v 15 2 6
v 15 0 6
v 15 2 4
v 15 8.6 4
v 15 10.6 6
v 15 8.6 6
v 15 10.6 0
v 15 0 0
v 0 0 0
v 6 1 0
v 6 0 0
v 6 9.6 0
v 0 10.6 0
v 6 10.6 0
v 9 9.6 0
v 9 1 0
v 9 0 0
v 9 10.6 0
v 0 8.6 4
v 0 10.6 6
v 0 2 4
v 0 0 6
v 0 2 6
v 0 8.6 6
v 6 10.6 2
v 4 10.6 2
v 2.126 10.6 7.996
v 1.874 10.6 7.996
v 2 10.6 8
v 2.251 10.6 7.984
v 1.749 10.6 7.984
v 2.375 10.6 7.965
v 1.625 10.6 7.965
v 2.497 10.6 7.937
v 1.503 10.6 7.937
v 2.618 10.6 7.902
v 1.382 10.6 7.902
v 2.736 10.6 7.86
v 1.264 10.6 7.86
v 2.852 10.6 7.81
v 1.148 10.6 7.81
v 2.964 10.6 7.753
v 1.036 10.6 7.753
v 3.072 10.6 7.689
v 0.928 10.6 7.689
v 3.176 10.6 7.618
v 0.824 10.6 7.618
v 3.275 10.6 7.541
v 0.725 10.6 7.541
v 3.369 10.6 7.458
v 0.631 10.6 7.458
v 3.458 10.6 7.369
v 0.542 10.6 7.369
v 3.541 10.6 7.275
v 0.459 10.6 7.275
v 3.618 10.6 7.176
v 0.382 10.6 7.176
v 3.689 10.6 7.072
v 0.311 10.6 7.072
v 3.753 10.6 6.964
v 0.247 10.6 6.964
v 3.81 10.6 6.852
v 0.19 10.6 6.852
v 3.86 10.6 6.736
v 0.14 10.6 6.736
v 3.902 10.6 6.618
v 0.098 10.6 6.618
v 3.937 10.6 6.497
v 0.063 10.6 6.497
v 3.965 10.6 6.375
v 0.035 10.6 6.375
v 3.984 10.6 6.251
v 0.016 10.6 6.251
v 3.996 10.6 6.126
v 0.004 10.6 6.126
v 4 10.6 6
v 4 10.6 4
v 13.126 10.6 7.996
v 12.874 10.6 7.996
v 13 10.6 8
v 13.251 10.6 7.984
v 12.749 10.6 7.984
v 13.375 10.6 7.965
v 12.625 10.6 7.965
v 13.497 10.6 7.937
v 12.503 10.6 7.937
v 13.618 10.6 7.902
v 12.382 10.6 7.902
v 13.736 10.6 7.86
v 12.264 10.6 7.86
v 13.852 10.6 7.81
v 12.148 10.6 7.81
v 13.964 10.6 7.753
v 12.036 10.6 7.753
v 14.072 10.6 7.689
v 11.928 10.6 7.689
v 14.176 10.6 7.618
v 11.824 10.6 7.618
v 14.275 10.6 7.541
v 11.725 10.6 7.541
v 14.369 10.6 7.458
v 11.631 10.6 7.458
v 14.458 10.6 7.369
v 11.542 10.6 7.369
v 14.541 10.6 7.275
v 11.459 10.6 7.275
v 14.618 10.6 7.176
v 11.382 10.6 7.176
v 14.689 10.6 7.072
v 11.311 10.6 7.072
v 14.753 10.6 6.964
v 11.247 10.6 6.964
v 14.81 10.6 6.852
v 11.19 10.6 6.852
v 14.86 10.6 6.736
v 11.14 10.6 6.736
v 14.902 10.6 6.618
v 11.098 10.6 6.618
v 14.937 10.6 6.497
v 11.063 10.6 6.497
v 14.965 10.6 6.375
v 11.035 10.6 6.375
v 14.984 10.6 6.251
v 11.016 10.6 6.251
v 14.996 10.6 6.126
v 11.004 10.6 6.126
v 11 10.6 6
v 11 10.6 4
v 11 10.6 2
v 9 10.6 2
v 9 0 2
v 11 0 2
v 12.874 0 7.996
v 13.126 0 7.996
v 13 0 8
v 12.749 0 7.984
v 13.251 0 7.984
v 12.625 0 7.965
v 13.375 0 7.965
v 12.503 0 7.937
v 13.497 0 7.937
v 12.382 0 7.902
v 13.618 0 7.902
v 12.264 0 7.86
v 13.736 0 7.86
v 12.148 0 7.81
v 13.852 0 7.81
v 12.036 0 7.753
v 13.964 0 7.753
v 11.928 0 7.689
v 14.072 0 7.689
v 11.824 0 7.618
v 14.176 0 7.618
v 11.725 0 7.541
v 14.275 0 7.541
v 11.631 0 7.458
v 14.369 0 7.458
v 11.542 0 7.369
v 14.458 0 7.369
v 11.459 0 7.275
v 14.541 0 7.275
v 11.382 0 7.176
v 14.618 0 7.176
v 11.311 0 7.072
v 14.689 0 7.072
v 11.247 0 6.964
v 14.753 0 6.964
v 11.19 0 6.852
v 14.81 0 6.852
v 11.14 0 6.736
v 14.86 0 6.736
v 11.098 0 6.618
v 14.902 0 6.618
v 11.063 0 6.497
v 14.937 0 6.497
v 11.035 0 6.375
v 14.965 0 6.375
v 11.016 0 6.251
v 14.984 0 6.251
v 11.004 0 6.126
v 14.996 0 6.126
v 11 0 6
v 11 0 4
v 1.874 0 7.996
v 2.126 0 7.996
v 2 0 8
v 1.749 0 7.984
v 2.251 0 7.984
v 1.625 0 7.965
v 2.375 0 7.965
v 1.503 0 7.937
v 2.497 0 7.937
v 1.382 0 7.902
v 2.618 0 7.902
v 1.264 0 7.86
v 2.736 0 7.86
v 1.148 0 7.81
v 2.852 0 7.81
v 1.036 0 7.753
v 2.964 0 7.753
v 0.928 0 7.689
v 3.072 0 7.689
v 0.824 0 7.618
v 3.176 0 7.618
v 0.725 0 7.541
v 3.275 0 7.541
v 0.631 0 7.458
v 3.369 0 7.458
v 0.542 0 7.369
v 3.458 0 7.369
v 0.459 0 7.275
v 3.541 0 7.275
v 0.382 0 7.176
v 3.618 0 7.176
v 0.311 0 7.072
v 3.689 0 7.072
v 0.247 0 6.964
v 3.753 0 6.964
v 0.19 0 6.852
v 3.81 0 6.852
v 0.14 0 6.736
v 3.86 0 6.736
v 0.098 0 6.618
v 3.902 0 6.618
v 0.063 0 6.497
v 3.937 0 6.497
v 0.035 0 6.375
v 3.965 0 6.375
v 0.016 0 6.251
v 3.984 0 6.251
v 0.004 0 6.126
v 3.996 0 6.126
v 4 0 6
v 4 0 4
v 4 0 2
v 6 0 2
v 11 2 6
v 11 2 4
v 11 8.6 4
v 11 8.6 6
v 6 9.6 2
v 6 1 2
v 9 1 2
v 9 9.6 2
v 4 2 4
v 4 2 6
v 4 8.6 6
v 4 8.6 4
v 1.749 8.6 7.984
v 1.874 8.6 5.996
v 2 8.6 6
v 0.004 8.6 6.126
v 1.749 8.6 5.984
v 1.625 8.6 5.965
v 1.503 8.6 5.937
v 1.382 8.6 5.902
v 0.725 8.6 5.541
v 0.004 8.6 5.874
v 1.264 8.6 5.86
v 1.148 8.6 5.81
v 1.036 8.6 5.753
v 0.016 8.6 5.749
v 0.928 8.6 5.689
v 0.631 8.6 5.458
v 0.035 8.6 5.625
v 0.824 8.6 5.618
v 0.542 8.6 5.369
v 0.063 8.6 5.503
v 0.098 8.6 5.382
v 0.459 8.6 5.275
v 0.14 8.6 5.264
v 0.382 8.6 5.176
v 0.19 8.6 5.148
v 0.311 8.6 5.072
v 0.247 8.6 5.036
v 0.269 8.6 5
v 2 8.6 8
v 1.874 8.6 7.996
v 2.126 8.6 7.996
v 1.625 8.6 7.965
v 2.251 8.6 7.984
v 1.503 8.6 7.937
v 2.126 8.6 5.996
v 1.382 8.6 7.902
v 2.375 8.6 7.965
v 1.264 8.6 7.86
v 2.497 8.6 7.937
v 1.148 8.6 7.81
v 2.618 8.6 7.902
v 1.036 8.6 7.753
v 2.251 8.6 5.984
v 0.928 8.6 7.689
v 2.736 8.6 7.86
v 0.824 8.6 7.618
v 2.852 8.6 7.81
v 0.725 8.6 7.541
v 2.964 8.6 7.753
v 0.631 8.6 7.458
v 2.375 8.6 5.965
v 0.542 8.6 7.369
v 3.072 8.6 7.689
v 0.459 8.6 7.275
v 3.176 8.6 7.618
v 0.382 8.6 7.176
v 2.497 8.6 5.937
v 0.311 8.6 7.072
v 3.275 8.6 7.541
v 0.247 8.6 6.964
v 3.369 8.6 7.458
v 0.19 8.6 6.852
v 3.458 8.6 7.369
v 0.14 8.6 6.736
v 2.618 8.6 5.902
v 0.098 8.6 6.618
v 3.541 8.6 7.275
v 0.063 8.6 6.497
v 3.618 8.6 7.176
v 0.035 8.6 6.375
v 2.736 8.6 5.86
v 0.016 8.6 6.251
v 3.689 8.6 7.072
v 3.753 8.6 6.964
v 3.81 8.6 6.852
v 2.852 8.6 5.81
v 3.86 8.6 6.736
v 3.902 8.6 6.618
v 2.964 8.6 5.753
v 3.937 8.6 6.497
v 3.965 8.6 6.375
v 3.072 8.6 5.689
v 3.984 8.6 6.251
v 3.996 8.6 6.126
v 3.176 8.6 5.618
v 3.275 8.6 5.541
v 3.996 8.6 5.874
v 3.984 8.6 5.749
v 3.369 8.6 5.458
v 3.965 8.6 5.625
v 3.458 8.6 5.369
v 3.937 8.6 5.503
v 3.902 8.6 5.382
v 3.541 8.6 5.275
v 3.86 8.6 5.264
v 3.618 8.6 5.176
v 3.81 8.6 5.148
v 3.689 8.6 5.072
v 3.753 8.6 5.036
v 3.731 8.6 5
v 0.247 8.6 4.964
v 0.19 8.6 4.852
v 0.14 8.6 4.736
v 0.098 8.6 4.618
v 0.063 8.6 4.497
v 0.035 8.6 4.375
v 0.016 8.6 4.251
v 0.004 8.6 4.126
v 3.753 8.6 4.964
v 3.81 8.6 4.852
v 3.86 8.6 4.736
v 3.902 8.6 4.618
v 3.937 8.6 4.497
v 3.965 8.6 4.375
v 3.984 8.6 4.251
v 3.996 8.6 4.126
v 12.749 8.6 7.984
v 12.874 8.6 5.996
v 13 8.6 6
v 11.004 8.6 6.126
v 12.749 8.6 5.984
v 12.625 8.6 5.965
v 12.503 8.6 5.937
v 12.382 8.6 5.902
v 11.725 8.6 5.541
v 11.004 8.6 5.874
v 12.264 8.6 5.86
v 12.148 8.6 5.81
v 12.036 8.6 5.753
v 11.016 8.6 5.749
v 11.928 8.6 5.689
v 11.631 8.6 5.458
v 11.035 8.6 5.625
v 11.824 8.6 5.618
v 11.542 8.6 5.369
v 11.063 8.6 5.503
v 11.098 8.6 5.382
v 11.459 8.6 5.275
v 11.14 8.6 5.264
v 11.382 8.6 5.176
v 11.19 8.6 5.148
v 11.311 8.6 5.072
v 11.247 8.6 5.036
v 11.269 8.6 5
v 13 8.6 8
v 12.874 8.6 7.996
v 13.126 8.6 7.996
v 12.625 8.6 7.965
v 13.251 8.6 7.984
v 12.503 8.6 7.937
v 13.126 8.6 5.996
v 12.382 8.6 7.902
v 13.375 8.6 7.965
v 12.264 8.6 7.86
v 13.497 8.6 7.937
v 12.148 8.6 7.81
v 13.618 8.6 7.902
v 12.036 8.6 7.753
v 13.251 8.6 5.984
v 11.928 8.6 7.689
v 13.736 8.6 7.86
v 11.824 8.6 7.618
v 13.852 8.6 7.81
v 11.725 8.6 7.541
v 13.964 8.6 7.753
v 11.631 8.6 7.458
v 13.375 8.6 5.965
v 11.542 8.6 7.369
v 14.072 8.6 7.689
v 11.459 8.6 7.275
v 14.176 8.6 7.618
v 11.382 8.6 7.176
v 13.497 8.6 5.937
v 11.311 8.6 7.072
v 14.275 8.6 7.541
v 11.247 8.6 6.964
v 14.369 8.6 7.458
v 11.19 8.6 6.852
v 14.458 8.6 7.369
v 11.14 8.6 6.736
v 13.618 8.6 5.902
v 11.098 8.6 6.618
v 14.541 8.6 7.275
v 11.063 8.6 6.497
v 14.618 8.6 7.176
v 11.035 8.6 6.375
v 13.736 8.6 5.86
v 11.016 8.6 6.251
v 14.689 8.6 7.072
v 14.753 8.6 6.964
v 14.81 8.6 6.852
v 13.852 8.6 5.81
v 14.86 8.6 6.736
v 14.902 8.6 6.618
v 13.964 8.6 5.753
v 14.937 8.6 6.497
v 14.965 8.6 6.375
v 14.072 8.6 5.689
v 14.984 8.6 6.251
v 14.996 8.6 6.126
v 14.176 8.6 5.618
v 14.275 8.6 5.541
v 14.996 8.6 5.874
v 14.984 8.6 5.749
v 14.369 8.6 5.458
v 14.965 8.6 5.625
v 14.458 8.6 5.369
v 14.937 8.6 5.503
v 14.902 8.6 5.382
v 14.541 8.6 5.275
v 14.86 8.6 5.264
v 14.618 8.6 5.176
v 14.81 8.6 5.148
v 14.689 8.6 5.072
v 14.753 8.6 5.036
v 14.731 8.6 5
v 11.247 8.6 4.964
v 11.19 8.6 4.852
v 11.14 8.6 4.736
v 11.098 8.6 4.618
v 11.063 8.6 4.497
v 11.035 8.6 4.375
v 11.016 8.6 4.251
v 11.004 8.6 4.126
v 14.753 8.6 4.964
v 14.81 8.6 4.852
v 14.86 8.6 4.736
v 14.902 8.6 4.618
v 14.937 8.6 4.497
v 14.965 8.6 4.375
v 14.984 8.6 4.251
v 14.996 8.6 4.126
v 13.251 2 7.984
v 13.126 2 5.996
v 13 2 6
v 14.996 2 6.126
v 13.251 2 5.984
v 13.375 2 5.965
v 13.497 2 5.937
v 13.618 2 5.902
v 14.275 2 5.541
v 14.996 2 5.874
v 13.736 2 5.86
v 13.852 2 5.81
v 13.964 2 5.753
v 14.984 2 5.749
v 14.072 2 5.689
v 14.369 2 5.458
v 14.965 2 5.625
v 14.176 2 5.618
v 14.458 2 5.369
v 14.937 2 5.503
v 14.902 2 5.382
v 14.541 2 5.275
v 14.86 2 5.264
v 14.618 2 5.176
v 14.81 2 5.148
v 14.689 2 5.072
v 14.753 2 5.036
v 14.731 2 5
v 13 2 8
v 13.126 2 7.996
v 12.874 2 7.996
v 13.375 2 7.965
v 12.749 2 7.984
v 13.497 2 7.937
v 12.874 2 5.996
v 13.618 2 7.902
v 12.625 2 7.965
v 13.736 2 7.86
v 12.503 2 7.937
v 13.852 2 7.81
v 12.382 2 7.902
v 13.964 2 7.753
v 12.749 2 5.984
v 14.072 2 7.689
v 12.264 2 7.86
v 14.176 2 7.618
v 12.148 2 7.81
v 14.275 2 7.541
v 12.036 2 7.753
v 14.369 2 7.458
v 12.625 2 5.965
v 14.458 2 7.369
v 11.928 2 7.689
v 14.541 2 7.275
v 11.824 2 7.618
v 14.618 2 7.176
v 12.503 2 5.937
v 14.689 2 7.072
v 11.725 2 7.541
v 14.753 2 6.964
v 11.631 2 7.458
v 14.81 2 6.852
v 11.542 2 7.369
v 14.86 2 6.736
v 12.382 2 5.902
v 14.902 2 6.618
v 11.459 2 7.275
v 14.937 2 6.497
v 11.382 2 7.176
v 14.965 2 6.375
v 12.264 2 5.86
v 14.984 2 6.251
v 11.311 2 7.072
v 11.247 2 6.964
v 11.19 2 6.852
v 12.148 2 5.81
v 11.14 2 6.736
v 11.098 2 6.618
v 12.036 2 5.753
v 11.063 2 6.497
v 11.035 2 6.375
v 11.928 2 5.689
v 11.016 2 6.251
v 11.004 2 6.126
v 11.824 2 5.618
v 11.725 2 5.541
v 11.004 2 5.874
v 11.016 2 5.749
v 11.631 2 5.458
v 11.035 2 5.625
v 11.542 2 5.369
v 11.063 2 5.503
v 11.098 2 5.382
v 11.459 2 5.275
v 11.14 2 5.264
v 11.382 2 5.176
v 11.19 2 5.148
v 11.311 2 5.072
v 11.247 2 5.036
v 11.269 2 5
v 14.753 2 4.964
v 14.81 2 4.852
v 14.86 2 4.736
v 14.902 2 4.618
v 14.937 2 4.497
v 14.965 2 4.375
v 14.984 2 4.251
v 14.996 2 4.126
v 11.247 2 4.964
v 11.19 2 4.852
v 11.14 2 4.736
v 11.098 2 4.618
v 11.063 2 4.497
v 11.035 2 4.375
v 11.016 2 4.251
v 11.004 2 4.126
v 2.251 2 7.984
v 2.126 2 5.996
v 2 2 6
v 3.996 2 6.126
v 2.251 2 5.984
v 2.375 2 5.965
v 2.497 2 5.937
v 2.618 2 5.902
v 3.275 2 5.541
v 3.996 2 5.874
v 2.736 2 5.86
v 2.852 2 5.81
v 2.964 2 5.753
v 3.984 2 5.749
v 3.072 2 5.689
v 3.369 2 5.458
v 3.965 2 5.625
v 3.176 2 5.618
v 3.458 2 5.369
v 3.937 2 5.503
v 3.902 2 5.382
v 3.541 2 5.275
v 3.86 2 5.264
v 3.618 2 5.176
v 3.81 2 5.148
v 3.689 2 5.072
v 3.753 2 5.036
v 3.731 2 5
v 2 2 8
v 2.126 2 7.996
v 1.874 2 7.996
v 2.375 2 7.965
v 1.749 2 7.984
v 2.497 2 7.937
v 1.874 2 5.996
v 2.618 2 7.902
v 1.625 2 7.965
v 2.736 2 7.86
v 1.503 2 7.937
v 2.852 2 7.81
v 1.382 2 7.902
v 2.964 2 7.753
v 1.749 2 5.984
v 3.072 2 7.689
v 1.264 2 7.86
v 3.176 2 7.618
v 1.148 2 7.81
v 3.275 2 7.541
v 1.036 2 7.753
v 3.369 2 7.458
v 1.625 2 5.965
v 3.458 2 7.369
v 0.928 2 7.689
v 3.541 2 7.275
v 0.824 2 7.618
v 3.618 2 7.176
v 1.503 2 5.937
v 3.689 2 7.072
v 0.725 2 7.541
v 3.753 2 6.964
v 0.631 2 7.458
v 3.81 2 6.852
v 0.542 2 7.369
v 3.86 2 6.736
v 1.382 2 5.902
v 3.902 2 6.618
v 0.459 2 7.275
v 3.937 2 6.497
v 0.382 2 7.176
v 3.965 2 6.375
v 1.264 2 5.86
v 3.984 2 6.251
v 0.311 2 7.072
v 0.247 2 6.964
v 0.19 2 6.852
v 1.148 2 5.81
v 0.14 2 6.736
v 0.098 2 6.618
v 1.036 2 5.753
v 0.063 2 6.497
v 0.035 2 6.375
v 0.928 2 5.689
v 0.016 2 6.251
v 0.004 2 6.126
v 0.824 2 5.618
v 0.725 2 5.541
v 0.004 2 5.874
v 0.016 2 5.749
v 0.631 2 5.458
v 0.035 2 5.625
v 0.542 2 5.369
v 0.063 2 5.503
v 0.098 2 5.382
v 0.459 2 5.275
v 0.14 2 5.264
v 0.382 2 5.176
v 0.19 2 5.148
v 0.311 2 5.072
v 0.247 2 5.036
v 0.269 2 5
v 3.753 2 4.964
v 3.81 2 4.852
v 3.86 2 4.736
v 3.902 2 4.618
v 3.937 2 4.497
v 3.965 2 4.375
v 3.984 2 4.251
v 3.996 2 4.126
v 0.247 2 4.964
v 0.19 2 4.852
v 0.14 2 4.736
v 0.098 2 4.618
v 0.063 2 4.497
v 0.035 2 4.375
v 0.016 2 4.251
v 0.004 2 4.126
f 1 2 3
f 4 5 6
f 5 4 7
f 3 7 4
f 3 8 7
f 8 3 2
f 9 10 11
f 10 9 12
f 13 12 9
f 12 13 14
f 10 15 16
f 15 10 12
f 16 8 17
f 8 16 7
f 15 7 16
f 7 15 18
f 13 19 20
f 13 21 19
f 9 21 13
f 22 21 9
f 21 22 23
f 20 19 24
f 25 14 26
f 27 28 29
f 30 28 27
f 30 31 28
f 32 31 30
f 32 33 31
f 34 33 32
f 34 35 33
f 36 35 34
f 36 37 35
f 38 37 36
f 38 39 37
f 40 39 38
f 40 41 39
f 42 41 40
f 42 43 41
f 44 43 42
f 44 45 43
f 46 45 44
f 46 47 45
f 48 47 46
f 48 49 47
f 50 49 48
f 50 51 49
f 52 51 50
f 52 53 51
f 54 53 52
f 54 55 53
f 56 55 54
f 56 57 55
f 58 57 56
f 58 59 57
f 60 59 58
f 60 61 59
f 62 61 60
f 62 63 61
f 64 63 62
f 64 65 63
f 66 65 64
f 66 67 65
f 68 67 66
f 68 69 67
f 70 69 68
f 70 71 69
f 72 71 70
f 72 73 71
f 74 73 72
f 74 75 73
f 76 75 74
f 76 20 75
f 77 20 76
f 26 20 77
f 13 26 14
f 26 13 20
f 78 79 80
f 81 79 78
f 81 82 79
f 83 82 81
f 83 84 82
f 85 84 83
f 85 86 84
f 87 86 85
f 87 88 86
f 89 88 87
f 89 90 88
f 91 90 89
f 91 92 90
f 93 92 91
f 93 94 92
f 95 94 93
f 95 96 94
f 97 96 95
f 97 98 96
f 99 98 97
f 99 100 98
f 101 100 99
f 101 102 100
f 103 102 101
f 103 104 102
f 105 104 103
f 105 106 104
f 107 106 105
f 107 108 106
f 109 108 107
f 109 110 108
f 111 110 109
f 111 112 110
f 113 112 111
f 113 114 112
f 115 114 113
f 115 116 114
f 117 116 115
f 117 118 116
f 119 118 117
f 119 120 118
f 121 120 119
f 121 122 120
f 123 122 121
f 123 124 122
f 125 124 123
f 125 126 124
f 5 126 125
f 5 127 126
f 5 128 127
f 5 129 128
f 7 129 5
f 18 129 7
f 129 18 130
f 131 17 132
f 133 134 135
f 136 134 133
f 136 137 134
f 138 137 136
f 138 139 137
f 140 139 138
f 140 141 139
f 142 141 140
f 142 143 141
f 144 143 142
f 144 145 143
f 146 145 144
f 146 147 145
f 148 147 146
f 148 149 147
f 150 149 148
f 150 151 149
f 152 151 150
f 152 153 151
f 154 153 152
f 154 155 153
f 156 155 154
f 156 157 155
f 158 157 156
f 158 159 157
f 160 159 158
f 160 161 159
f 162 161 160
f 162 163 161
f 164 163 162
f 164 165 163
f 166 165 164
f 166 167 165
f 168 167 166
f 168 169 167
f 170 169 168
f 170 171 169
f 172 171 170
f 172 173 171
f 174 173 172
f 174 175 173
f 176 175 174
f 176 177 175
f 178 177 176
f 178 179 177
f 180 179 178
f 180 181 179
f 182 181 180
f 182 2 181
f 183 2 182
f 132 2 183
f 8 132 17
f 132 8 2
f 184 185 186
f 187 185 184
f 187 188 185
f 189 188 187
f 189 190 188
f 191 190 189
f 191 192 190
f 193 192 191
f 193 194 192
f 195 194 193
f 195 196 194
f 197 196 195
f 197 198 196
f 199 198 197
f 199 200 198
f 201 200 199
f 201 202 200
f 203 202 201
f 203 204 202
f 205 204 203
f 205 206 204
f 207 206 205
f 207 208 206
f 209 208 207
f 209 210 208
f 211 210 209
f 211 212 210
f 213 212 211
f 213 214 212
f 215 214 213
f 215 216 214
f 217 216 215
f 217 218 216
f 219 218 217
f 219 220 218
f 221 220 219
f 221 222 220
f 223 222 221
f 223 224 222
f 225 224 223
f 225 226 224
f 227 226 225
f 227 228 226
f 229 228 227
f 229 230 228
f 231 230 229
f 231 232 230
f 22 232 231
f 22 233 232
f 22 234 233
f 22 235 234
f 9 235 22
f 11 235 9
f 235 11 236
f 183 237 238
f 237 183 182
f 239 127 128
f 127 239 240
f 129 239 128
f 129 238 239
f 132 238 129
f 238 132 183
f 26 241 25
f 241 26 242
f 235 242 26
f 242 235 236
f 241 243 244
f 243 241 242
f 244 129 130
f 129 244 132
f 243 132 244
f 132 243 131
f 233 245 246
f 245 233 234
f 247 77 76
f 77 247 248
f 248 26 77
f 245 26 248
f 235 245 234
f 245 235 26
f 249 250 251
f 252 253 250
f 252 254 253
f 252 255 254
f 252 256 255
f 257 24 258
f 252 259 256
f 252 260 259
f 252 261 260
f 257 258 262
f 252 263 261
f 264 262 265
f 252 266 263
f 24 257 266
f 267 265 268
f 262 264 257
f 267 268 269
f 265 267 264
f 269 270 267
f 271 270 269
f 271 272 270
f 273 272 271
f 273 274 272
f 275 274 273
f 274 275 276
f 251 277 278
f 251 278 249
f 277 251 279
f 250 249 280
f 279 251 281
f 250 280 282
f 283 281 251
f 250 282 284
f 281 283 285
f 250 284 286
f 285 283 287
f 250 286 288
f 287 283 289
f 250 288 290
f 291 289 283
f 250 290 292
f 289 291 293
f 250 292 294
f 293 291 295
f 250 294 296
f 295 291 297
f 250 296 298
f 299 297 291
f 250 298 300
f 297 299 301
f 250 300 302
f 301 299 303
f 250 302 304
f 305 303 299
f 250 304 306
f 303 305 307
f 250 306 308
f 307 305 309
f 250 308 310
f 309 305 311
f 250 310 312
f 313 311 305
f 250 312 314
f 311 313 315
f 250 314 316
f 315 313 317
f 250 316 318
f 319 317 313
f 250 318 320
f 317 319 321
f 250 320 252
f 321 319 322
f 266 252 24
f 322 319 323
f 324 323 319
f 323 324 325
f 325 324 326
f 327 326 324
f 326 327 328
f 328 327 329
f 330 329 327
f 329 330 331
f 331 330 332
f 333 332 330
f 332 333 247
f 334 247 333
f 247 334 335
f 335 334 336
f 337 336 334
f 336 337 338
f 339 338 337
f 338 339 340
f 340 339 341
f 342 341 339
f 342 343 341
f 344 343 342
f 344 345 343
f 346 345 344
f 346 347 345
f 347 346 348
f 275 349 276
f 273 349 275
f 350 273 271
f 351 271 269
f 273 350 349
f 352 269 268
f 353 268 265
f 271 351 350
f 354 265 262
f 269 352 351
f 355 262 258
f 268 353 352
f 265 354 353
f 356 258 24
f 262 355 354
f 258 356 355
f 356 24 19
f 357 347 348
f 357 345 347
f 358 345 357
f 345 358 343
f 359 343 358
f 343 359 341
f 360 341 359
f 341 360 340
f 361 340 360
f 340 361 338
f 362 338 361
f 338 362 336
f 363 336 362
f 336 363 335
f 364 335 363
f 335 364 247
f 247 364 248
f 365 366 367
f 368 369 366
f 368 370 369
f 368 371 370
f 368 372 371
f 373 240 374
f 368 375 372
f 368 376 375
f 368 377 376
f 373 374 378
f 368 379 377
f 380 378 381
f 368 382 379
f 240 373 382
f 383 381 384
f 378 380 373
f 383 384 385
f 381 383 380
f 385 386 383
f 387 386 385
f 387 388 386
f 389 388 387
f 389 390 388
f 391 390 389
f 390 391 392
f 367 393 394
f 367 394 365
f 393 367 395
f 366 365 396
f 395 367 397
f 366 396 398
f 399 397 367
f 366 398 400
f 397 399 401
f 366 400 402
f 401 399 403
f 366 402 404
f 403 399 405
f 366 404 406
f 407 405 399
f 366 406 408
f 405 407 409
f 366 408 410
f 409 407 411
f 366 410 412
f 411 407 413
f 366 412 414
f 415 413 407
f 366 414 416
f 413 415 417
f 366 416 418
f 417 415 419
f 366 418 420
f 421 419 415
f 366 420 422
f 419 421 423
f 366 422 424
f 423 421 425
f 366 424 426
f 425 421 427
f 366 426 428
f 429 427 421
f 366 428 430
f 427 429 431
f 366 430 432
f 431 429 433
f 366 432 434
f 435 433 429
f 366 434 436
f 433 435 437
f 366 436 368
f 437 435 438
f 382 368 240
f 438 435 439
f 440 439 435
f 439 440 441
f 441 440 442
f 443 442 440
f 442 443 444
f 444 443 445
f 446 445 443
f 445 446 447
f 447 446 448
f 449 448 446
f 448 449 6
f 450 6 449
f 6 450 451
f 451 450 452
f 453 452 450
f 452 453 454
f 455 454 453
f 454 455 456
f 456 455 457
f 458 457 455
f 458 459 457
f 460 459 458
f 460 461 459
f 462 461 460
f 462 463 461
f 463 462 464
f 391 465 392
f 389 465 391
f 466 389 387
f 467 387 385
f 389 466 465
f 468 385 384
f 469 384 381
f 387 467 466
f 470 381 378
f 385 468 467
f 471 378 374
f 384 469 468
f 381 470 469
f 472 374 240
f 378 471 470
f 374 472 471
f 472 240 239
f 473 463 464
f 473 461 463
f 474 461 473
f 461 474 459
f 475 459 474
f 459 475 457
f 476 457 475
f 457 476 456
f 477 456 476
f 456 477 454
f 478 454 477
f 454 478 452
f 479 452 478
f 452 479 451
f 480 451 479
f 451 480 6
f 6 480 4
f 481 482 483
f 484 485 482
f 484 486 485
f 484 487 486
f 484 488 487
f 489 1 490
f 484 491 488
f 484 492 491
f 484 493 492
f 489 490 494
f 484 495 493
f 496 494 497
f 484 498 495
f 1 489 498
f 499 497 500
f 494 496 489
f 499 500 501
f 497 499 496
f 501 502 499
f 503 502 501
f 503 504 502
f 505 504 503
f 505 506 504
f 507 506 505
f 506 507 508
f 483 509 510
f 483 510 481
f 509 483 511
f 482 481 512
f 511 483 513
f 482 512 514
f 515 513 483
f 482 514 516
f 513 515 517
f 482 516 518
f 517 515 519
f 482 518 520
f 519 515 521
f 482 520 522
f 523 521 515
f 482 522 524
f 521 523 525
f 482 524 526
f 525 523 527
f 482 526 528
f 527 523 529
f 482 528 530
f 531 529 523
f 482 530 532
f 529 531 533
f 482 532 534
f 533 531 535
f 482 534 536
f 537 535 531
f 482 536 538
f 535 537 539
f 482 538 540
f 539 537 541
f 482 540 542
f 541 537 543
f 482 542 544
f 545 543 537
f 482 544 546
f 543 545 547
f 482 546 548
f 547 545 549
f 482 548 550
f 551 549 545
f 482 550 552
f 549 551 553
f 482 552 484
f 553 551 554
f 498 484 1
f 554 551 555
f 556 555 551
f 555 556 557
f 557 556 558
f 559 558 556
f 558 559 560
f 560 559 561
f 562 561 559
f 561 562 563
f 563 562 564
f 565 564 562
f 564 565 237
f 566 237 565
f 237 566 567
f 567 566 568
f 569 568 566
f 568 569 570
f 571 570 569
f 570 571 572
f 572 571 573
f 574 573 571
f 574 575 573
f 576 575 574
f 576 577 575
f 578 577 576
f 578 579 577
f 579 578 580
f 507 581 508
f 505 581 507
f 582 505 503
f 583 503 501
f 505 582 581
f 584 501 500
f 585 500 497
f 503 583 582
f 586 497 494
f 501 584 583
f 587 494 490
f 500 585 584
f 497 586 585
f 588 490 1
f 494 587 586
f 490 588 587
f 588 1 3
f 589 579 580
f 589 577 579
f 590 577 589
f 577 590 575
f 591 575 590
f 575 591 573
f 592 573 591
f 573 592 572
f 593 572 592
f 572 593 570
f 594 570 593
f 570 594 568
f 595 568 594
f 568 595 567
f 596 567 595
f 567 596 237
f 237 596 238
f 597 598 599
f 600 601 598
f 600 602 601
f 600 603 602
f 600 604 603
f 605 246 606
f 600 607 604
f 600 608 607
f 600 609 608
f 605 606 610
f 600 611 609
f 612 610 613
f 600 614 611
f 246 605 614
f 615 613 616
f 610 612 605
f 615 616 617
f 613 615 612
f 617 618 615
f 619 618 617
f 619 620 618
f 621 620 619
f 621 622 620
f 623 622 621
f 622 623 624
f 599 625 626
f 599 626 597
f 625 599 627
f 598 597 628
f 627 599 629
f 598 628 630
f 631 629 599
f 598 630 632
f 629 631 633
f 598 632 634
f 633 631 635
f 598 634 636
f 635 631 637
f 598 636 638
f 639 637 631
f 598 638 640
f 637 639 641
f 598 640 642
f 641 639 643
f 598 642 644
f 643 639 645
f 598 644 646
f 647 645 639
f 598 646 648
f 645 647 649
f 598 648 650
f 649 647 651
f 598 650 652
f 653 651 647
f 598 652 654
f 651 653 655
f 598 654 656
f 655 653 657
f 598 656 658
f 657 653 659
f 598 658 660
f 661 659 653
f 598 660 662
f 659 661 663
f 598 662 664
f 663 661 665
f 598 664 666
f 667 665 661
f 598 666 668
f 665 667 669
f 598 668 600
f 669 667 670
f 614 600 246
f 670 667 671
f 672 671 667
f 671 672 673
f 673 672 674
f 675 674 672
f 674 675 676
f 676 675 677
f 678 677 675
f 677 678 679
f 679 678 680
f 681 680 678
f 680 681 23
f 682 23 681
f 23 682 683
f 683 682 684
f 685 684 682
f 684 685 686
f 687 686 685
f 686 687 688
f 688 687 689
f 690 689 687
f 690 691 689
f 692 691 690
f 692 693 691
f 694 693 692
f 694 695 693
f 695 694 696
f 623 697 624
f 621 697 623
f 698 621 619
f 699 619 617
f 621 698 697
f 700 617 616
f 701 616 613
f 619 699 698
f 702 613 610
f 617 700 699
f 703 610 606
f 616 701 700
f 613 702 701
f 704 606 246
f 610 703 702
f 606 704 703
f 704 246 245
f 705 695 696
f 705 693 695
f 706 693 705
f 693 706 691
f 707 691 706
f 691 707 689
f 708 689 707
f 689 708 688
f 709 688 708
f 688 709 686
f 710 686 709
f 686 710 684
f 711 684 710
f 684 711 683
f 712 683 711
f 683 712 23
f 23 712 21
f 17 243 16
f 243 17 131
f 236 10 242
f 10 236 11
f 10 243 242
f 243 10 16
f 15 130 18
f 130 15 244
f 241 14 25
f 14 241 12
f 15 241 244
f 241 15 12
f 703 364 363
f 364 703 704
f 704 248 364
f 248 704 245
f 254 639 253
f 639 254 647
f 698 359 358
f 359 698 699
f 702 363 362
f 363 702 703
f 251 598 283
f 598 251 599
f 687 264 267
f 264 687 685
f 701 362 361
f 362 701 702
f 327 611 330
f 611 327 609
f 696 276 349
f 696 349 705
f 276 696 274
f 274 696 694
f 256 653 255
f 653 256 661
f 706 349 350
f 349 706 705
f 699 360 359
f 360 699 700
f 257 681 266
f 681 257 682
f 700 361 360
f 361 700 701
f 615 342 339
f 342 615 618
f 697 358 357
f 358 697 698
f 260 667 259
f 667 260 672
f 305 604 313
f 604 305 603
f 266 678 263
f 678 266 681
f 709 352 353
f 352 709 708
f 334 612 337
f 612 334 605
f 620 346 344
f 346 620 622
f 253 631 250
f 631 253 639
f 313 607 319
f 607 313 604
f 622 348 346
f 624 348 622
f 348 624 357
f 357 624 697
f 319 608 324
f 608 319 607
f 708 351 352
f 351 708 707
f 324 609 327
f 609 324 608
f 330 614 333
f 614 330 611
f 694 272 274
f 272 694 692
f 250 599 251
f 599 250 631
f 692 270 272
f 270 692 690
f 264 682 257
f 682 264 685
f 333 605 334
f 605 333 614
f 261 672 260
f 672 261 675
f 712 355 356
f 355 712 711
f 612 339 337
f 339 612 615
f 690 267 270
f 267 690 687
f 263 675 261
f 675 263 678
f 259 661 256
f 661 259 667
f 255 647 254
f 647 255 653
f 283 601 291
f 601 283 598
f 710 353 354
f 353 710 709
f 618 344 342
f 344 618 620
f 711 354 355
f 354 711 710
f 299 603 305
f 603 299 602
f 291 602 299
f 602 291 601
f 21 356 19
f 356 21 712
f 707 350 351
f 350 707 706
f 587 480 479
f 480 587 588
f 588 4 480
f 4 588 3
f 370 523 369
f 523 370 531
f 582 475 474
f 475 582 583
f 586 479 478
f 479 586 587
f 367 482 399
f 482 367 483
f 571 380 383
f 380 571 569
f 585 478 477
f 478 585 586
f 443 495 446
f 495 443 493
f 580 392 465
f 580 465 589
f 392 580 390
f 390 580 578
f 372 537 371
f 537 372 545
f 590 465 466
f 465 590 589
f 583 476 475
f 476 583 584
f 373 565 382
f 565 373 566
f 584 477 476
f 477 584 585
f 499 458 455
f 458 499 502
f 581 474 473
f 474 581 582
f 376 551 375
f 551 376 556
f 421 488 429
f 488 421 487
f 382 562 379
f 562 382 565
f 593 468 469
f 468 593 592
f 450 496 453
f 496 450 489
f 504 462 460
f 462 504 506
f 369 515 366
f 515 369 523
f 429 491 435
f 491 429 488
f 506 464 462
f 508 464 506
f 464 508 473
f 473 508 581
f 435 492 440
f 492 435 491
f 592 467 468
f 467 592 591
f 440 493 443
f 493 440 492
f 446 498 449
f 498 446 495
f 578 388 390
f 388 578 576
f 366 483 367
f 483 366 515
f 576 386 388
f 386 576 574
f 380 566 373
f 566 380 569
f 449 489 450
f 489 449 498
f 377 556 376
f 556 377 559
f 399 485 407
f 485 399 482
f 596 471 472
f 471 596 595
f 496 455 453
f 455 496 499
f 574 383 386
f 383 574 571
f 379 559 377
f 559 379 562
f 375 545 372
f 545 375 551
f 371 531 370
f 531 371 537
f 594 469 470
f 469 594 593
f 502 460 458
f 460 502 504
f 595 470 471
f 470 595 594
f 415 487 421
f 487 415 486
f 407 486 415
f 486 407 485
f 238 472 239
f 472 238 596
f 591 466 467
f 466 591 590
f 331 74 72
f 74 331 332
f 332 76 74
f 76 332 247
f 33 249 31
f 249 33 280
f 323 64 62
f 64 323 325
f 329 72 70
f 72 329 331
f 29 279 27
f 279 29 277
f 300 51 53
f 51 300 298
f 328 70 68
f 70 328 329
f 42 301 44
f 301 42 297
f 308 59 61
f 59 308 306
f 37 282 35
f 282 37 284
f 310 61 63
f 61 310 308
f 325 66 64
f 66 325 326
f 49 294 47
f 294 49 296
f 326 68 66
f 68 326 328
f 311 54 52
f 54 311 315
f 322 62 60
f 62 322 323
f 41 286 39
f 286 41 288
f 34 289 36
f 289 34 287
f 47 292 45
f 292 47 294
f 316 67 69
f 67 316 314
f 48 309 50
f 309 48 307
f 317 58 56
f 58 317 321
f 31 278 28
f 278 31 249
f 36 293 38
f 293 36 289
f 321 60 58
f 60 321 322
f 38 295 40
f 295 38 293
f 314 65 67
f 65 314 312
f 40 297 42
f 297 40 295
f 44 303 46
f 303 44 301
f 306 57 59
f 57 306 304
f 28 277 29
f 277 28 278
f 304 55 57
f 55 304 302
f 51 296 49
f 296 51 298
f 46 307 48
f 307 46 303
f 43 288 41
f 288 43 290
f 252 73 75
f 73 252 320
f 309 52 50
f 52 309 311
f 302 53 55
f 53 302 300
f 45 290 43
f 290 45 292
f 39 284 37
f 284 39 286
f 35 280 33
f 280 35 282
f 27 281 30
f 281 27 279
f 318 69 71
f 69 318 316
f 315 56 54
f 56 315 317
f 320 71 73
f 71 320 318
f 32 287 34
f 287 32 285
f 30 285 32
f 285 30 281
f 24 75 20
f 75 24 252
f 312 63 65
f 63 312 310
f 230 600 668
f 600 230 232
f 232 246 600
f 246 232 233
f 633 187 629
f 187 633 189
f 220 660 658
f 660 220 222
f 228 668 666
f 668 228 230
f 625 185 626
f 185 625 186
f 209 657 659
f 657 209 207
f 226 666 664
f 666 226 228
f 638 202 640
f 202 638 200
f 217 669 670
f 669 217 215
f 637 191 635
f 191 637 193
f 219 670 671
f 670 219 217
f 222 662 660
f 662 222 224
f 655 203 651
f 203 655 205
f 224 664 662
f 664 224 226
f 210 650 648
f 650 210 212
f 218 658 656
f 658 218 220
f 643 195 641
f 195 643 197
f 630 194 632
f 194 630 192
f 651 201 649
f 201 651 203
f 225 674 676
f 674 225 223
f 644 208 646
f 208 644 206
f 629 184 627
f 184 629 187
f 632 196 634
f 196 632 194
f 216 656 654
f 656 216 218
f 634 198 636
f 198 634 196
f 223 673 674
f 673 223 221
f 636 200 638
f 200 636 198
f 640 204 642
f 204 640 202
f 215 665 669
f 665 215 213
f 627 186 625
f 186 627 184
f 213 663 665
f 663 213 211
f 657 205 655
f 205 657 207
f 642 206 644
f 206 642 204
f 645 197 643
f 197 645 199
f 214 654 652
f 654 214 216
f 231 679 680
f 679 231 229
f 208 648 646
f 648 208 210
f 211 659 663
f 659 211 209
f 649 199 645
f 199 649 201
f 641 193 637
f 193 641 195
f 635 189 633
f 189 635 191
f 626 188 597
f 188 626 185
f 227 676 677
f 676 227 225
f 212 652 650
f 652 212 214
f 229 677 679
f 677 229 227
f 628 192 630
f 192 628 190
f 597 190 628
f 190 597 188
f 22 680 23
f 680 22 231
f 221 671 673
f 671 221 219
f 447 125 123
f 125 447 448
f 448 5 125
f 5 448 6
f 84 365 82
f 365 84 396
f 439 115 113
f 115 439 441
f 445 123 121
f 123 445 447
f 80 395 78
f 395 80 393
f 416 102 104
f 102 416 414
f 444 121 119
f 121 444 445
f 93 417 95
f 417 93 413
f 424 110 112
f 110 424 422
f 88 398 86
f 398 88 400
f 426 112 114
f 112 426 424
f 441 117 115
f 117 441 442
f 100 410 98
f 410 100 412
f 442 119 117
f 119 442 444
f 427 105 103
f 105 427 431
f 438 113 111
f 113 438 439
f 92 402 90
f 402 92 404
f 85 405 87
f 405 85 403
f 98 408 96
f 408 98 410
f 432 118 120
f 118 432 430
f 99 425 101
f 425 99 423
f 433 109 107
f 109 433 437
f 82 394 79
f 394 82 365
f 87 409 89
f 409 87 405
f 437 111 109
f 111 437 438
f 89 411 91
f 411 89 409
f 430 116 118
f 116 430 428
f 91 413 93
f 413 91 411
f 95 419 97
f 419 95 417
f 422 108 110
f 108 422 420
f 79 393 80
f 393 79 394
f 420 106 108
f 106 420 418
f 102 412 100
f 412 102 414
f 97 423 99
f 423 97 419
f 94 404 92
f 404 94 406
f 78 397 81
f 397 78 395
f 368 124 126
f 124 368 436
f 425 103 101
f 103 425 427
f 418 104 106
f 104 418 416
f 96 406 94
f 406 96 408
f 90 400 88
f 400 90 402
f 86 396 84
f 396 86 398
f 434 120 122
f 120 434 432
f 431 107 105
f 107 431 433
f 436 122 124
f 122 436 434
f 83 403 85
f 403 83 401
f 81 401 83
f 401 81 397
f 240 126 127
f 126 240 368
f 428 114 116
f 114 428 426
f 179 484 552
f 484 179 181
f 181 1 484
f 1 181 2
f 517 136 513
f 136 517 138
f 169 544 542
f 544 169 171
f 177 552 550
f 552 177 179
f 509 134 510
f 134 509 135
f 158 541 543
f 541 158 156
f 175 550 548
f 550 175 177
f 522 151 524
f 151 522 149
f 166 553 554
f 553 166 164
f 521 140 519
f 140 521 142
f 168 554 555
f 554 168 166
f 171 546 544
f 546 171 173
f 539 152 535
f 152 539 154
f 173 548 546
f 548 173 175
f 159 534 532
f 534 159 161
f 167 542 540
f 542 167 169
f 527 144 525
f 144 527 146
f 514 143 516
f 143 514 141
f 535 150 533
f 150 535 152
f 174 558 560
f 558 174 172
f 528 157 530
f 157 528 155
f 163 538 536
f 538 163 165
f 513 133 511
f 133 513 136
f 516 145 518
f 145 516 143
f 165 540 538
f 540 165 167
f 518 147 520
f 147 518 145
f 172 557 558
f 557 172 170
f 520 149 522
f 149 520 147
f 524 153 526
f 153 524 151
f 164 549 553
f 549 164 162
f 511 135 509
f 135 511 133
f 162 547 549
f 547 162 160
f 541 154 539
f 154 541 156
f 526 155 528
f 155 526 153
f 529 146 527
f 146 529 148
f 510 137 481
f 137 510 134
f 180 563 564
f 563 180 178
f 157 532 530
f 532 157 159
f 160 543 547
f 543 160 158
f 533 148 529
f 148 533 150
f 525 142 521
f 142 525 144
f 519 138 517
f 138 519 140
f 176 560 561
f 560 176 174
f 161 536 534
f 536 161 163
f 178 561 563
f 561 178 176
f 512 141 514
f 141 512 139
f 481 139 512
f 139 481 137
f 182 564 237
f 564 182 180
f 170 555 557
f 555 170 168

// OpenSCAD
//******************* OTHER FILES NEEDED ************************************** 


//*****************************************************************************
//******************* VARIABLES TO ADJUST *************************************

bottomBlockHeight = 2;
baseToBelt = 6;
width = 10;
centreGap = 7;
beltWidth = 6.6;
cableTieWidth = 3;
cableTieRecess = 1;
beltPathRadius = 2;
outsideWidth = 2;
beltRecessHeight = 2;

//*****************************************************************************
//******************* OTHER VARIABLES *****************************************

$fn = 100;
$fa=1;
$fs=.3;

//*****************************************************************************
//******************* VIEW ****************************************************

beltTightener();

//doublebeltTightener();

//*****************************************************************************
//******************* MODULES *************************************************

module beltTightener(){
length = beltPathRadius * 4 + centreGap;
width = outsideWidth * 2 + beltWidth;
blockHeight = baseToBelt + beltRecessHeight - beltPathRadius;
	union(){
		difference(){
			cube([length,width,blockHeight]);
				translate([beltPathRadius * 2,-1,bottomBlockHeight])
					cube([length - beltPathRadius * 4,width + 2,baseToBelt + beltRecessHeight]);
				translate([-1,outsideWidth,baseToBelt - beltPathRadius])
					cube([length + 2,beltWidth,beltRecessHeight + 1]);
				translate([length / 2 - cableTieWidth / 2, -1, -1])
					cube([cableTieWidth,cableTieRecess + 1,bottomBlockHeight + 2]);
				translate([length / 2 - cableTieWidth / 2, width - cableTieRecess, -1])
					cube([cableTieWidth,cableTieRecess + 1,bottomBlockHeight + 2]);
		}
		translate([beltPathRadius, width, baseToBelt - beltPathRadius]) rotate([90, 0, 0]) cylinder(r = beltPathRadius, h = width);
		translate([length - beltPathRadius, width, baseToBelt - beltPathRadius]) rotate([90, 0, 0]) cylinder(r = beltPathRadius, h = width);
		translate([beltPathRadius, width, baseToBelt + beltRecessHeight - beltPathRadius]) rotate([90, 0, 0]) cylinder(r = beltPathRadius, h = outsideWidth);
		translate([beltPathRadius, outsideWidth, baseToBelt + beltRecessHeight - beltPathRadius]) rotate([90, 0, 0]) cylinder(r = beltPathRadius, h = outsideWidth);
		translate([length - beltPathRadius, width, baseToBelt + beltRecessHeight - beltPathRadius]) rotate([90, 0, 0]) cylinder(r = beltPathRadius, h = outsideWidth);
		translate([length - beltPathRadius, outsideWidth, baseToBelt + beltRecessHeight - beltPathRadius]) rotate([90, 0, 0]) cylinder(r = beltPathRadius, h = outsideWidth);

	}
}


module doublebeltTightener(){
	union(){
		beltTightener();
		translate([beltPathRadius * 2 + centreGap, 0, 0]) beltTightener();
	}
}


//********************** END MODULES ******************************************
